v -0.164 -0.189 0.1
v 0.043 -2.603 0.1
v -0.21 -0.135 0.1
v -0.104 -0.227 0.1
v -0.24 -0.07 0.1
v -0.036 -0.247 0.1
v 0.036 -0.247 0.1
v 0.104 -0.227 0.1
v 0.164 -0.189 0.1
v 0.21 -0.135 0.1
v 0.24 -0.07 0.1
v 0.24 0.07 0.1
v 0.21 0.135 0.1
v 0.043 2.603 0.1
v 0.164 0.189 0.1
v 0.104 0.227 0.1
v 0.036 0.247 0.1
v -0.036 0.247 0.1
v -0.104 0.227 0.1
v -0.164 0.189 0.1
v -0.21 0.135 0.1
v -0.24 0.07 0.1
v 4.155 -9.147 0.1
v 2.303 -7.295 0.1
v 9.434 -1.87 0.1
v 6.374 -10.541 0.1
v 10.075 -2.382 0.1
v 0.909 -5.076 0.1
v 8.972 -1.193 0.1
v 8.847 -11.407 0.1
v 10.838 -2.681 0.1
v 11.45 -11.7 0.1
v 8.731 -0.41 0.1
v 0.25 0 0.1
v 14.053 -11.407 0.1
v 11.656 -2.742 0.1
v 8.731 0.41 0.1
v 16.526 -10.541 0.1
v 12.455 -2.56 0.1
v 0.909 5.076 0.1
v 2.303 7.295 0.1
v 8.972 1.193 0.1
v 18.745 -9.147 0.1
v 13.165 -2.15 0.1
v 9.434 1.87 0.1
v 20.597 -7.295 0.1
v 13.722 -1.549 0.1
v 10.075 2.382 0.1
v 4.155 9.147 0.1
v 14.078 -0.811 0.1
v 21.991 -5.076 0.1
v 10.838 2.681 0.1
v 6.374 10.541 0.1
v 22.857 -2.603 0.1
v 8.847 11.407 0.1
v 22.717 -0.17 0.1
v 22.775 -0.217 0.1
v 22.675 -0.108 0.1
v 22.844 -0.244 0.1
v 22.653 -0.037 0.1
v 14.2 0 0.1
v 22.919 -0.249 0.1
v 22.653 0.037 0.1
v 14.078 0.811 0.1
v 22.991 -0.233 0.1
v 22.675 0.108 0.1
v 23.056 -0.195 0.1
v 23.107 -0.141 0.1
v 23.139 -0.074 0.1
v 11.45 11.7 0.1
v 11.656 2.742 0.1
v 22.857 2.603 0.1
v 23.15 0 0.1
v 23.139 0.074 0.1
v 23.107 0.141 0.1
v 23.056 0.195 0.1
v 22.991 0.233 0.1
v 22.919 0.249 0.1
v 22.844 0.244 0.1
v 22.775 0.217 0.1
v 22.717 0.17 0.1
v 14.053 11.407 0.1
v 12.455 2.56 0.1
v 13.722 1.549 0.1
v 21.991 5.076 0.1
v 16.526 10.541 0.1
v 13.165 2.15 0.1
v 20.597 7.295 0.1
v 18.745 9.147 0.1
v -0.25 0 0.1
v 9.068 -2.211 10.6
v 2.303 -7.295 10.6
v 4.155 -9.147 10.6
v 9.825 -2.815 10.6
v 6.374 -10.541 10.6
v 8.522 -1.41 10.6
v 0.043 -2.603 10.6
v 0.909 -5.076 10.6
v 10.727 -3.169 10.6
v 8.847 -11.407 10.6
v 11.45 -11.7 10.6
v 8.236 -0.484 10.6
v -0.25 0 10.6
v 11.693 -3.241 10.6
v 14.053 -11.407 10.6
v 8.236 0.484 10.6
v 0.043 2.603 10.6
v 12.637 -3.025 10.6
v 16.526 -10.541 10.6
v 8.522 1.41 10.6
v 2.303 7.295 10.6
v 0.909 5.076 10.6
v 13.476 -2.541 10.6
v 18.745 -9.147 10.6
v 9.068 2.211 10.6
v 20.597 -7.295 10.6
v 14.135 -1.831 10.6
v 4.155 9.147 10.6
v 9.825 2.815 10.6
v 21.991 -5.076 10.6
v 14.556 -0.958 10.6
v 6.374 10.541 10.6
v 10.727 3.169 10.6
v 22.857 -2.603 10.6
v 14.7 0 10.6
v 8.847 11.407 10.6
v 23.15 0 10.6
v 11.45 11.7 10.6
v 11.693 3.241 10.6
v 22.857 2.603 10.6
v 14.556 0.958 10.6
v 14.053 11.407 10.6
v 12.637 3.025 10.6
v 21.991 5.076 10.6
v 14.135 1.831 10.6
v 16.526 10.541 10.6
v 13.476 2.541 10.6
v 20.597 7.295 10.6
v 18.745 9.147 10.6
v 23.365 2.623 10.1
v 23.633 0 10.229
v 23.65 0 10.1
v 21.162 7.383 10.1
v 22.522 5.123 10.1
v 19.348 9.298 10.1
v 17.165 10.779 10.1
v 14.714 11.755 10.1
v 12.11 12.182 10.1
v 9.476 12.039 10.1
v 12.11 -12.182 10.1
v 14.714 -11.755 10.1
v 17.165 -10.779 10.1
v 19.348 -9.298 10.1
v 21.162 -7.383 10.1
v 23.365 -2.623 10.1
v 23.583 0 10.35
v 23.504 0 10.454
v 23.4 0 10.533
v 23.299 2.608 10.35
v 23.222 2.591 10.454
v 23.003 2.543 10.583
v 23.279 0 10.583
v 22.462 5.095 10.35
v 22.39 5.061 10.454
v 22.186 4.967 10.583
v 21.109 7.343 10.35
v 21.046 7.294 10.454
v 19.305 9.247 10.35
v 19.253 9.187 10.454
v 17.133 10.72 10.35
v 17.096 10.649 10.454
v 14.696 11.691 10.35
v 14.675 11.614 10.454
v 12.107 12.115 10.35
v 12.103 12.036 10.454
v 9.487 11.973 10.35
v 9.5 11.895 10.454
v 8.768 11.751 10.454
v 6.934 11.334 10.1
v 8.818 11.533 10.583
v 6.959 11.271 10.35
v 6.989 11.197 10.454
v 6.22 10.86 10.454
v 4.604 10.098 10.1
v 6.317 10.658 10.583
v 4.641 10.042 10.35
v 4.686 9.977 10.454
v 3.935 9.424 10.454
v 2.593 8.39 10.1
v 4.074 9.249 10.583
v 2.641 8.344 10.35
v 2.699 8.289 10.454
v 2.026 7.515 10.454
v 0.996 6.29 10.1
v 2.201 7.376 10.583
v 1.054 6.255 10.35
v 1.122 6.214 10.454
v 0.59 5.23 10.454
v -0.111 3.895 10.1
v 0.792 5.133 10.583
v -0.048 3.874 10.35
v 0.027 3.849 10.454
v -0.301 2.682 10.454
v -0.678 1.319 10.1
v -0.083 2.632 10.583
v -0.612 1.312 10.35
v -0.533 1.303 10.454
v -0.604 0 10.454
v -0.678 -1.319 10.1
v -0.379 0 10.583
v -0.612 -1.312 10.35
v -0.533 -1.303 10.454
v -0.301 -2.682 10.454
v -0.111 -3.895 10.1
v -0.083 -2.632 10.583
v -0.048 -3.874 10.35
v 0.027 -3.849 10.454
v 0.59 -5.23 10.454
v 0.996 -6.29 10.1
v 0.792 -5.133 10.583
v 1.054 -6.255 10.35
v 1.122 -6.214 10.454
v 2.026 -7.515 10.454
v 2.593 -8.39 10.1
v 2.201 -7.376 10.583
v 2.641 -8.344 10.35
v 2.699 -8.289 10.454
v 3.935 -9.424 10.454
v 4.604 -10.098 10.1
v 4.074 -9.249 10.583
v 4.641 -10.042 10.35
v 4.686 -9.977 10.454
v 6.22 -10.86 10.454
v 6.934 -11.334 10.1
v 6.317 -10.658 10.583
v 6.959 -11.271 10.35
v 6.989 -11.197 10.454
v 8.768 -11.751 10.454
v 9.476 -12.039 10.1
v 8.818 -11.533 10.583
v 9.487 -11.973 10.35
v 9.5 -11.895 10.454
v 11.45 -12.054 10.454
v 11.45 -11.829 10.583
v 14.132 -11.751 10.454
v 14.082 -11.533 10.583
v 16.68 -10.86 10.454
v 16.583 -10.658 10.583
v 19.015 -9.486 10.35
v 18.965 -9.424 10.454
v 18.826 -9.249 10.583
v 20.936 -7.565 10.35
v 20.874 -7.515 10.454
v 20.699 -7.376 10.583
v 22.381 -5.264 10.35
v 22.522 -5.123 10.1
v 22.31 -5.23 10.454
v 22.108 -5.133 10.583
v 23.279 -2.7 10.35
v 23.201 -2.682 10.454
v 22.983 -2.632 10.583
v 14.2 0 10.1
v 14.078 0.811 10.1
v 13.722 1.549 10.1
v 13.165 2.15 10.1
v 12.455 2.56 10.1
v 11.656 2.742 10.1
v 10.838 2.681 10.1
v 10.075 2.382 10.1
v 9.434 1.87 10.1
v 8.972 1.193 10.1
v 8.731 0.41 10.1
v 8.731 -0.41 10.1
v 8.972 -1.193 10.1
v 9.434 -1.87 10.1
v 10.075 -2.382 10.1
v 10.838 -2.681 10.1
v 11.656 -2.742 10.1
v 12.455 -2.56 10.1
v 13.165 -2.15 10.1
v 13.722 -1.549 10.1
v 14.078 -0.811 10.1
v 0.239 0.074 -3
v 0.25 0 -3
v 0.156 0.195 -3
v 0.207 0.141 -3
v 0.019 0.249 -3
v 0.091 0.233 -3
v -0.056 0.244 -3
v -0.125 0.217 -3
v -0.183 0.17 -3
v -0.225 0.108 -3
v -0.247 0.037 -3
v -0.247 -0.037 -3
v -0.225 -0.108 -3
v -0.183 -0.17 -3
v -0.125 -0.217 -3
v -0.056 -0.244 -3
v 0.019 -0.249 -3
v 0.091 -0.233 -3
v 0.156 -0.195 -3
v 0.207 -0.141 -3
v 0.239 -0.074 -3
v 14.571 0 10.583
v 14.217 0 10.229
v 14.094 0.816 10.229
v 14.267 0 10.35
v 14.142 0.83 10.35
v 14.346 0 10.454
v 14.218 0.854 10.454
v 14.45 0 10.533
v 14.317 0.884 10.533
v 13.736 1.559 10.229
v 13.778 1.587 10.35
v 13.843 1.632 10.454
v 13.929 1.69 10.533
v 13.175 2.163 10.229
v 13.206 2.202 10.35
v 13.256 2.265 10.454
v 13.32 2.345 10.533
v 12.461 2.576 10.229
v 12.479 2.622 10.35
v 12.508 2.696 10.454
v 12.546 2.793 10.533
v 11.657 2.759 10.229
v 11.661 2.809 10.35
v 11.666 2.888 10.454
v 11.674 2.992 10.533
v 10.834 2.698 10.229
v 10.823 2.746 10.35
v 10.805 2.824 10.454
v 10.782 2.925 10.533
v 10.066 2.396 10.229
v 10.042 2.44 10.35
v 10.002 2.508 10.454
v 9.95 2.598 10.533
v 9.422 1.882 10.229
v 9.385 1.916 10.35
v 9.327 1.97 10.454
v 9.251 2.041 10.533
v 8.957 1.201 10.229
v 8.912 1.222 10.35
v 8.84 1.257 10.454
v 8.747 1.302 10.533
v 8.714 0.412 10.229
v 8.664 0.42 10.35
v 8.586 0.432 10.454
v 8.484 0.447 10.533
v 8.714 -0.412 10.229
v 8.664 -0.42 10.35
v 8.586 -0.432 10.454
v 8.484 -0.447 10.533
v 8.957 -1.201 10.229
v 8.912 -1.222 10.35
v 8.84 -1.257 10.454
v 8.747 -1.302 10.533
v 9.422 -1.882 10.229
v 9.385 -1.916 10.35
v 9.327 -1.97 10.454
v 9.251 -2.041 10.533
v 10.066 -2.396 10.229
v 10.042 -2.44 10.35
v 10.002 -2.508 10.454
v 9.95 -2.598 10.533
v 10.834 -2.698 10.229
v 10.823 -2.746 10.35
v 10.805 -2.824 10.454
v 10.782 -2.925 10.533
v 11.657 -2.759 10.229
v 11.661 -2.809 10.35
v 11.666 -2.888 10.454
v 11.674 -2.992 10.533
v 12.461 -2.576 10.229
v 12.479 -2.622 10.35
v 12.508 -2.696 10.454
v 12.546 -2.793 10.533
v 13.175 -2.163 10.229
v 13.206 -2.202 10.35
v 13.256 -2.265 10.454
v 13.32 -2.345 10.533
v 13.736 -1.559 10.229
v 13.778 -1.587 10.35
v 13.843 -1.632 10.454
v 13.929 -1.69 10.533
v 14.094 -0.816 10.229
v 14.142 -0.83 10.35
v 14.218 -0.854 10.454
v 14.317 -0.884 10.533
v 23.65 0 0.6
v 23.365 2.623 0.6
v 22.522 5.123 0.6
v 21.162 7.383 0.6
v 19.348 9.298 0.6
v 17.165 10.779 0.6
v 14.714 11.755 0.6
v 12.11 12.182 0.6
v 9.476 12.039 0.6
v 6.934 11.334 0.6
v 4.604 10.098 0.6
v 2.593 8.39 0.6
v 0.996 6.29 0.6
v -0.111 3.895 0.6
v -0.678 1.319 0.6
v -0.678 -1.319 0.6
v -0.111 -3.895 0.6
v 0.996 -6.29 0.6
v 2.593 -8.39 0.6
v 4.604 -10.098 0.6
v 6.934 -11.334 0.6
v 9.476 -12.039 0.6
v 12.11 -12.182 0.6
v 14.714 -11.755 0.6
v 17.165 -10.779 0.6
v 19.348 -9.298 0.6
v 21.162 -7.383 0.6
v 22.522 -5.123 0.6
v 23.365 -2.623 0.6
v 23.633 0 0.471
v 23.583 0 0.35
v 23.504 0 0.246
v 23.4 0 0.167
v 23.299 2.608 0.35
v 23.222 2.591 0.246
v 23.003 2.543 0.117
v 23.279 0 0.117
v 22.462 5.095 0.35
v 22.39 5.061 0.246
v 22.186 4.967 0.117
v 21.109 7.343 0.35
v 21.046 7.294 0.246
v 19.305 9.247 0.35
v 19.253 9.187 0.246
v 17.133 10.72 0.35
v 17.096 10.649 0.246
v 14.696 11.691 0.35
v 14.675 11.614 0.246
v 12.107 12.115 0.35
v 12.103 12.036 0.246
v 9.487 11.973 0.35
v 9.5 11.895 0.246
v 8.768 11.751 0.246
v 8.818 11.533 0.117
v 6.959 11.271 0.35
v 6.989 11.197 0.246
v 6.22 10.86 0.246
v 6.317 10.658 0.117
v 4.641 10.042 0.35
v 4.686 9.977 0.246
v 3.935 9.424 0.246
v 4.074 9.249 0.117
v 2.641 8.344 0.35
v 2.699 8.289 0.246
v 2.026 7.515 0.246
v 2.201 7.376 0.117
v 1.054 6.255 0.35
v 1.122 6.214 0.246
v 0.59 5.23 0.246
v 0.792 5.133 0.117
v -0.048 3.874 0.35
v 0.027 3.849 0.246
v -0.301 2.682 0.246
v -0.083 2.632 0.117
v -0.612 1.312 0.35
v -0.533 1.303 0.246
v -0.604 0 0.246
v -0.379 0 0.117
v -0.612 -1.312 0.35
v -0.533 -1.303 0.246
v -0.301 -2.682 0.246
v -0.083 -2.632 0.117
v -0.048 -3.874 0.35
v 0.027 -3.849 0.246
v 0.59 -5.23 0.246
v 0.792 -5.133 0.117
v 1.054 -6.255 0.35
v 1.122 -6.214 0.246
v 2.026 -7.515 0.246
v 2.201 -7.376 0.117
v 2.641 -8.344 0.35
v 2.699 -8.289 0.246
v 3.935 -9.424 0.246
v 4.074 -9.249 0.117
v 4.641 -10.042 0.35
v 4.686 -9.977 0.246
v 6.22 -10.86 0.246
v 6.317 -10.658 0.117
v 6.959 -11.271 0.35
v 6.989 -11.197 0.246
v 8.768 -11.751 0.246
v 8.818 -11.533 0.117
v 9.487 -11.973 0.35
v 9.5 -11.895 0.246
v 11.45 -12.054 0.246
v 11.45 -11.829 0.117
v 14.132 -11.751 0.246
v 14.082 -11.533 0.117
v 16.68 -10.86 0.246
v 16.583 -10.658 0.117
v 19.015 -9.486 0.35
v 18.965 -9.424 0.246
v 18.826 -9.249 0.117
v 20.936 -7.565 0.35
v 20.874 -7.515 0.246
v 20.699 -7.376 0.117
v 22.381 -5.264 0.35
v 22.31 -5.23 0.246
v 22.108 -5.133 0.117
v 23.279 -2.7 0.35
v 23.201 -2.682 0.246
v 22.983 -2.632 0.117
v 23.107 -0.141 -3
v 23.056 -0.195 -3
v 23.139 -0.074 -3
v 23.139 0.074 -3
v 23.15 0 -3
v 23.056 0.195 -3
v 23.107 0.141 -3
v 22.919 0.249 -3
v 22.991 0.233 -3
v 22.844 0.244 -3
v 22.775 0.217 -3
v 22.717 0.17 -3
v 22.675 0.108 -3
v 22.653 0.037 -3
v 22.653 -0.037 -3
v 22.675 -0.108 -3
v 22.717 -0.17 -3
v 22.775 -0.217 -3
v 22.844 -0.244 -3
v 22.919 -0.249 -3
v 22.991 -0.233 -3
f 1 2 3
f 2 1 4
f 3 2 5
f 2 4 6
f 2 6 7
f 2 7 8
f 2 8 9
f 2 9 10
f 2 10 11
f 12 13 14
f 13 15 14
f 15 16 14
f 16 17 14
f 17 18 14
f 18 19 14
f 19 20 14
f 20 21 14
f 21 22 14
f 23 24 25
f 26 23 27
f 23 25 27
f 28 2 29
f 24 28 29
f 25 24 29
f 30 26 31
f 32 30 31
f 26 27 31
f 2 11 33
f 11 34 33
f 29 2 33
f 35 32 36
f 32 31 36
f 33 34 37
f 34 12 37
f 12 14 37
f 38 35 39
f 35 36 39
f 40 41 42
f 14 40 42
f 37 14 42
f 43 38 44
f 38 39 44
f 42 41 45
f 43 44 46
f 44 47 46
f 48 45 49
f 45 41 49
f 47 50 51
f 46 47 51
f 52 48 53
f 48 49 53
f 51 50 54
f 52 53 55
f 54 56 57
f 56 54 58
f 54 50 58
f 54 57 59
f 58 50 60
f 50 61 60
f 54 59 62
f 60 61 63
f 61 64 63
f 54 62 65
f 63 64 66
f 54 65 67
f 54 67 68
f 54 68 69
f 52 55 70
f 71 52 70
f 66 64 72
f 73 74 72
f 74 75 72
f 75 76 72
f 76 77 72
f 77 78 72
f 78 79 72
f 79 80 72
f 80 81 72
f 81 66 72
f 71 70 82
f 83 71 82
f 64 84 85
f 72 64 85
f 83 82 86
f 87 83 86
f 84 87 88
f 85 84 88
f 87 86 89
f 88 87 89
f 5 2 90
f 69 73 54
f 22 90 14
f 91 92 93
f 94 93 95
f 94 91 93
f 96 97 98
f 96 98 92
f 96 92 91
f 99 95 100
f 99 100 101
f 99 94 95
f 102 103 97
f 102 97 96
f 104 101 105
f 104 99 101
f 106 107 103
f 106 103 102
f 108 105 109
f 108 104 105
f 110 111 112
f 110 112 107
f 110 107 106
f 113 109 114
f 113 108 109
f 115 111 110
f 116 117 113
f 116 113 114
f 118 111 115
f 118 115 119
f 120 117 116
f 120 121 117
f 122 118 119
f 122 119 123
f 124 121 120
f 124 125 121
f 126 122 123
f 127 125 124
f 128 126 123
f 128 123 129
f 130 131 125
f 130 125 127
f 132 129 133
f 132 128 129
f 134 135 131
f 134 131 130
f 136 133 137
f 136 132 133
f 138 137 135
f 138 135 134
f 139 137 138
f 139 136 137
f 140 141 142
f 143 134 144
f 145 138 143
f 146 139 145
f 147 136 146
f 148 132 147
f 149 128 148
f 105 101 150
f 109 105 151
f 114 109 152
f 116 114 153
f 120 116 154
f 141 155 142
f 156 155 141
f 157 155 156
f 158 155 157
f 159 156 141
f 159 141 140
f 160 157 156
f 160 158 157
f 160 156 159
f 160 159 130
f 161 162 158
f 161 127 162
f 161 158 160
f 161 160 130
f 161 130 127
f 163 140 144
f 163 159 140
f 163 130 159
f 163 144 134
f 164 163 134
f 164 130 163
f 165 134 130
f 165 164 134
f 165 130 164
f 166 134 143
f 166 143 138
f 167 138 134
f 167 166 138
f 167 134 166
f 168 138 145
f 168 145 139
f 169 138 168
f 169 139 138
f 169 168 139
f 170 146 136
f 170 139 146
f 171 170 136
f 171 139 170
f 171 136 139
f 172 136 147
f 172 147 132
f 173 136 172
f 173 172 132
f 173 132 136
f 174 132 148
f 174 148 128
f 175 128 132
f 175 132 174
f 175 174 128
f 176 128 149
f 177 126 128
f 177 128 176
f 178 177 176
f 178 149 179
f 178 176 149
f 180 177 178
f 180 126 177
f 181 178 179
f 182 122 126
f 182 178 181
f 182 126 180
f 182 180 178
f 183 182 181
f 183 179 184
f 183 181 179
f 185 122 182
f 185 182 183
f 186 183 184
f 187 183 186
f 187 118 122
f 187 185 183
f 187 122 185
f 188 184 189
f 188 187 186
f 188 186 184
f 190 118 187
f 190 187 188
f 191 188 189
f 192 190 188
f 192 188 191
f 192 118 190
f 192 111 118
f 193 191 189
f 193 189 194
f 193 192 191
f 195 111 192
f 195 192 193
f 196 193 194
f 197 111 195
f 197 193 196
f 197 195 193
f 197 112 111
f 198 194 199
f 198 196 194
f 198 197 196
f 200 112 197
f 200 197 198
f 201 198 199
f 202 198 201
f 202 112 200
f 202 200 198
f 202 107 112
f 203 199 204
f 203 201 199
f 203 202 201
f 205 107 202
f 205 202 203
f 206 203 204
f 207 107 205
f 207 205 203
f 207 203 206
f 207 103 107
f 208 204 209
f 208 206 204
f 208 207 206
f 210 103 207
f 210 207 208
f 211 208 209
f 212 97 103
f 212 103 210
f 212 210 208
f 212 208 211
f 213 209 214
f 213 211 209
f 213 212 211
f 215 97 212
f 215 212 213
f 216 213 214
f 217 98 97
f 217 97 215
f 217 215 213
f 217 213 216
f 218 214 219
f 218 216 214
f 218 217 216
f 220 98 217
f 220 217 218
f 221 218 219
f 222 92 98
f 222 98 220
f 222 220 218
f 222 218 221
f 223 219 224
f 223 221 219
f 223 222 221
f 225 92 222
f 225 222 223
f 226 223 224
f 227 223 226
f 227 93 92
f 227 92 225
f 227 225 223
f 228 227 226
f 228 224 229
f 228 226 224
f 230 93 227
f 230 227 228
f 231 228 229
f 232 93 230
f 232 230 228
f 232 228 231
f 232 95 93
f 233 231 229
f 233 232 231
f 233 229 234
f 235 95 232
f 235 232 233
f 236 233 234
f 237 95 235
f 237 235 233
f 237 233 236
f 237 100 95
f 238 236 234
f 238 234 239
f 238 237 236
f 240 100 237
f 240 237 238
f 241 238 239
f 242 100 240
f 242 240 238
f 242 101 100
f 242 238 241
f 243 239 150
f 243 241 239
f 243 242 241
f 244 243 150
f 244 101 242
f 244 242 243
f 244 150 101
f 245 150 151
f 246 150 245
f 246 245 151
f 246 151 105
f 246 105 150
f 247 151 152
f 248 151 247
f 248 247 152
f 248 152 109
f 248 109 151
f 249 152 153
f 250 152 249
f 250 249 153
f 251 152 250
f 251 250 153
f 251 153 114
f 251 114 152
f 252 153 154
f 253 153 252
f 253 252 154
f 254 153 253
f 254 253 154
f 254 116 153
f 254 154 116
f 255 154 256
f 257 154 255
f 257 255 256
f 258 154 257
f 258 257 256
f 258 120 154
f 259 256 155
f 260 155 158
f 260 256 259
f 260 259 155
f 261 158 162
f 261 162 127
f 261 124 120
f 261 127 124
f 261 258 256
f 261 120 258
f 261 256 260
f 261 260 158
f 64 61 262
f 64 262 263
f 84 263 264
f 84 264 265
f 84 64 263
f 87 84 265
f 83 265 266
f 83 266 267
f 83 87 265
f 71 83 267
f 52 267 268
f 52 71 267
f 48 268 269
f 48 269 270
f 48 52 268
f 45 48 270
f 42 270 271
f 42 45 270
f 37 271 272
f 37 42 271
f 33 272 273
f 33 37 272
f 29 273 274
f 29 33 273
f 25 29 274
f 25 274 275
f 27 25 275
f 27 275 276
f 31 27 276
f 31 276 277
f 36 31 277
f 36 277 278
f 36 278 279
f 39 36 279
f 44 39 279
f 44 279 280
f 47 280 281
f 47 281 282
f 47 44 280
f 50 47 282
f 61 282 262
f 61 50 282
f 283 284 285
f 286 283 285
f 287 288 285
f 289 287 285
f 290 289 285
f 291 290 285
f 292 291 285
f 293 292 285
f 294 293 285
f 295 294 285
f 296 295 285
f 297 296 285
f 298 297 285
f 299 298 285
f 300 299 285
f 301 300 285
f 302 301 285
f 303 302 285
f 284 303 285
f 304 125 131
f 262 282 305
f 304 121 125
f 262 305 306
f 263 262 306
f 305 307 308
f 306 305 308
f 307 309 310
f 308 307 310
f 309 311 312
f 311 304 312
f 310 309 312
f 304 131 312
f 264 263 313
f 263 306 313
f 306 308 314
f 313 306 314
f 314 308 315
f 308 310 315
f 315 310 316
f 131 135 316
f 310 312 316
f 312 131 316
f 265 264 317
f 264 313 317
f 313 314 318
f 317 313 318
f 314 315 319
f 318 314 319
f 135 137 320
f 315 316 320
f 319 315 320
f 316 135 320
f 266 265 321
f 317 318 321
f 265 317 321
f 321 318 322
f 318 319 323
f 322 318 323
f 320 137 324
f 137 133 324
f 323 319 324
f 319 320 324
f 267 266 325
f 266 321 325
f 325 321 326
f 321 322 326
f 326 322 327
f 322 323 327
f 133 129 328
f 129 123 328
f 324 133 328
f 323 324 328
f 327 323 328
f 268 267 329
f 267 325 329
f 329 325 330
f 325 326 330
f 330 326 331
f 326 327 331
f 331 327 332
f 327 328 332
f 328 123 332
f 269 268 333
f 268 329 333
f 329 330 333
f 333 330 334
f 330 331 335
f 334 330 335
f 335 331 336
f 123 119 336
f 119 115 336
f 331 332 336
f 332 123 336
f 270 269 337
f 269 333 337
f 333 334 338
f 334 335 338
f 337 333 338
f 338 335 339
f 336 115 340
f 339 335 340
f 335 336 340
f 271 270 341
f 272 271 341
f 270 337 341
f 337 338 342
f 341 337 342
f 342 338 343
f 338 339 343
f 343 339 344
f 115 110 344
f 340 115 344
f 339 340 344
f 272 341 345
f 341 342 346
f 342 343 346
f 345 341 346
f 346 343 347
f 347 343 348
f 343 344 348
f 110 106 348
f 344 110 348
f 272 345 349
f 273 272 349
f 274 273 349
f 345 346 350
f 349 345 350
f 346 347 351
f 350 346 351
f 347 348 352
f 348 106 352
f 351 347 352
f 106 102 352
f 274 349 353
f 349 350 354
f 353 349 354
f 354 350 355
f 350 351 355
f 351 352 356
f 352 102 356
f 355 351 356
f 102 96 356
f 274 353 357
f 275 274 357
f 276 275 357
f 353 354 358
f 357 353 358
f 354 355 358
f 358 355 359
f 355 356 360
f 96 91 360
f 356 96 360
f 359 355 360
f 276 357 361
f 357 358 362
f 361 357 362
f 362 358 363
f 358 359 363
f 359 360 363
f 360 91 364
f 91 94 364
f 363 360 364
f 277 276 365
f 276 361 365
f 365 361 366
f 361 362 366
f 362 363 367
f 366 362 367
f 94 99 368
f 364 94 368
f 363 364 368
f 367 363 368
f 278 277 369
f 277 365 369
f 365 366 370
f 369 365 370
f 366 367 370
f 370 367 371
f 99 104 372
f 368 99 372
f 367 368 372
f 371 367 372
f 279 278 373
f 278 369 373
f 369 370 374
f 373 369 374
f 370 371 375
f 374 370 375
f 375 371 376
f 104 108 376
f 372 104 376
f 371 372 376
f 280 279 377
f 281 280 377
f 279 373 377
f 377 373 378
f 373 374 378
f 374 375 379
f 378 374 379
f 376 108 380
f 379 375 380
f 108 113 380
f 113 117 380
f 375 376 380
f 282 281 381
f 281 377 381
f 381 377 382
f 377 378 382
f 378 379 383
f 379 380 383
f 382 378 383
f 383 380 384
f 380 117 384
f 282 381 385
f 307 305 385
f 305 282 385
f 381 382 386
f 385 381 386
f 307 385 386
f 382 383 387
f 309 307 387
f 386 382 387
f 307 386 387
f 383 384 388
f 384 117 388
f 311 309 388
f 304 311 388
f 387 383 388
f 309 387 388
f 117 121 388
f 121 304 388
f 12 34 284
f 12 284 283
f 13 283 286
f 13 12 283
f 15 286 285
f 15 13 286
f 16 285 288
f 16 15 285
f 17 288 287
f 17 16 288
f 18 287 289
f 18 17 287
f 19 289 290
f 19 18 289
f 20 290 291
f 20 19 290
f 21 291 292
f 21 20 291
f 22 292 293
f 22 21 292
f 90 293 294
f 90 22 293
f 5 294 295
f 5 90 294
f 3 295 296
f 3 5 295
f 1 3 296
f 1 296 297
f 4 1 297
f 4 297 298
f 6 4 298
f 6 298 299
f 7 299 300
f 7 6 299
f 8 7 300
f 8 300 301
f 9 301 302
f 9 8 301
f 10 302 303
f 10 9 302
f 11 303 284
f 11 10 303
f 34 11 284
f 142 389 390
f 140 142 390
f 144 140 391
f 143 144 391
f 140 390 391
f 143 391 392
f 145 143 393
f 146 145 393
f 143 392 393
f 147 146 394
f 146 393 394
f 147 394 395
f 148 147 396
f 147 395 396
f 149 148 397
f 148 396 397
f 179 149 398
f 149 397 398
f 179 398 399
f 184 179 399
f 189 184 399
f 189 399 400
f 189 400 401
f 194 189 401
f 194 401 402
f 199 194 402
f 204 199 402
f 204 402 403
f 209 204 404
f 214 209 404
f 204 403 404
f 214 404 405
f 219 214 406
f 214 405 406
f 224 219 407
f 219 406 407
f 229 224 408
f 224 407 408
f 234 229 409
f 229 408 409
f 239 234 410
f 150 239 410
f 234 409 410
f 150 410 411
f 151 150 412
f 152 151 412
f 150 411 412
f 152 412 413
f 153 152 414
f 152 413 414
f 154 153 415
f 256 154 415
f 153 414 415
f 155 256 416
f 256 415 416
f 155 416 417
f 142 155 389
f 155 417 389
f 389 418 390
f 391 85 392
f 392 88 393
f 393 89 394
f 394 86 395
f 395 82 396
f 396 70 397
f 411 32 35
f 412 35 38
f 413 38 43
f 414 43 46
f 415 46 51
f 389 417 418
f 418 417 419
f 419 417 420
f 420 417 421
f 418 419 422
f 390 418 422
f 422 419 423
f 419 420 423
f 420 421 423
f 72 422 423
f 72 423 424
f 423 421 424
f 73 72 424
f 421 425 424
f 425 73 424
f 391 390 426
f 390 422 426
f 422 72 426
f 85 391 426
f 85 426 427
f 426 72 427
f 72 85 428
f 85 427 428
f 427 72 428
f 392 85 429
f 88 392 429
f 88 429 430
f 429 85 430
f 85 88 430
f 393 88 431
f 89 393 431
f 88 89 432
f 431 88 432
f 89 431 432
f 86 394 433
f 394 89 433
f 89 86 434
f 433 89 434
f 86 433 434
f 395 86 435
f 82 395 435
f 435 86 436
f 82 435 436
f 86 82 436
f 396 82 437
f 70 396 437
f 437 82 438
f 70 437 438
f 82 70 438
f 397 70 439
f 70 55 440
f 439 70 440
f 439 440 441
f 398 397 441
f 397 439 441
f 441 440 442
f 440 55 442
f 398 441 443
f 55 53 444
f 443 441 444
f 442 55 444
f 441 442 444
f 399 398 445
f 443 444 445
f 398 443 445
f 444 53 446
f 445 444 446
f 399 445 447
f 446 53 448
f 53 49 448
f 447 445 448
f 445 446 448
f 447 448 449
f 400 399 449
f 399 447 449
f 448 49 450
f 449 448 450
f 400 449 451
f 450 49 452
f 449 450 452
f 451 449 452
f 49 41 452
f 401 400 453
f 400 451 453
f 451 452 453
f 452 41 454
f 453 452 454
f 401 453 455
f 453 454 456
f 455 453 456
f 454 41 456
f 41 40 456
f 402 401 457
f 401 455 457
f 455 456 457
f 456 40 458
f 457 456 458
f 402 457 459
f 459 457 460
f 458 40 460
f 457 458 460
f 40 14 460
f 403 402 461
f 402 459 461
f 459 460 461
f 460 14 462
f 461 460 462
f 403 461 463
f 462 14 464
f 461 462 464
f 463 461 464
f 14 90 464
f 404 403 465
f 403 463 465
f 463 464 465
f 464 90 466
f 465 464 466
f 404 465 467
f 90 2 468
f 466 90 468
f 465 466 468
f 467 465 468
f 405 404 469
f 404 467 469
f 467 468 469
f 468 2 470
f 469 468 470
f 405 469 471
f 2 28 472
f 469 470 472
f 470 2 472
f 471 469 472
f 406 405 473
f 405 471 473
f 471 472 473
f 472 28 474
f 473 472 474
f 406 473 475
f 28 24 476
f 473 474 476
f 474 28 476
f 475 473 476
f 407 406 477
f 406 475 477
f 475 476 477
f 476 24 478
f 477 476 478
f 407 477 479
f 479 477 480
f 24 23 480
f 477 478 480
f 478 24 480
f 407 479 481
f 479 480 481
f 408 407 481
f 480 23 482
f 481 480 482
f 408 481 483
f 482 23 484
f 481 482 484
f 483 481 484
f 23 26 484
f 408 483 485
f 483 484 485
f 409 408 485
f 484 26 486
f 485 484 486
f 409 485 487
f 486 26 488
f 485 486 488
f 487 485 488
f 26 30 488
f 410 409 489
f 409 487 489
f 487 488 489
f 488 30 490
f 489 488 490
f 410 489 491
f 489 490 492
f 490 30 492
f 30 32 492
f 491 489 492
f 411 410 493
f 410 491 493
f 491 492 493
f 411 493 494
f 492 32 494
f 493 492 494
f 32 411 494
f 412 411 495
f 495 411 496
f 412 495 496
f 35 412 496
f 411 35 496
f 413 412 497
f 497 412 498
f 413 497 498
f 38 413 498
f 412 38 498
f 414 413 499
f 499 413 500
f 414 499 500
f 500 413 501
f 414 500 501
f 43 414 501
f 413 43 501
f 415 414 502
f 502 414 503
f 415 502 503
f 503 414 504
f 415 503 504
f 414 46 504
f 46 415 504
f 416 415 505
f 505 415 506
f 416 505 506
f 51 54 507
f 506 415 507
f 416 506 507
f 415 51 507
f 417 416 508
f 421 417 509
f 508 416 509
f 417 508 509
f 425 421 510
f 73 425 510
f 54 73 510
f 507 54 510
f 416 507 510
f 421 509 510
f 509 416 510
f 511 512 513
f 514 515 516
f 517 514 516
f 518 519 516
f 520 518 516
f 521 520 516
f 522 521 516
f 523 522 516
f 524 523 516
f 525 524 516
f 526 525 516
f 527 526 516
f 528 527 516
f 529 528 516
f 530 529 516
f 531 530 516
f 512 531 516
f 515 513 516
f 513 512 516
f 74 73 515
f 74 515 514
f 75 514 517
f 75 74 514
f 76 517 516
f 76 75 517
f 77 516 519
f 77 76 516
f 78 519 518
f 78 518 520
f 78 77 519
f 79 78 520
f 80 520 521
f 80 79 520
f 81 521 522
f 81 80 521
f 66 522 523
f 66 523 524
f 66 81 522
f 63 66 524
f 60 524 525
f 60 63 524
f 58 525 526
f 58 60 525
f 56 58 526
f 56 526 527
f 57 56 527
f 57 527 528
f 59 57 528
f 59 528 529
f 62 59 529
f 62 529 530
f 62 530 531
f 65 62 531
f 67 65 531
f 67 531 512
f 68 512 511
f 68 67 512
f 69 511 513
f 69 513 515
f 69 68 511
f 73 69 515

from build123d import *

# Parameters (mm, degrees)
SKETCH001_R       = 0.25
PAD001_DEPTH      = 5.25
PAD001_DEPTH_BACK = 3.5
SKETCH_R          = 12.2
SKETCH_R_2        = 2.75
PAD_DEPTH         = 10.5
FILLET_R          = 0.5


with BuildPart() as pad001:
    # Sketch001 → Pad001 (new body, two sides)
    with BuildSketch(Plane.XY.offset(0.5)) as pad001_sk:
        Circle(SKETCH001_R)
        with Locations((22.9, 0)):
            Circle(SKETCH001_R)
    extrude(amount=PAD001_DEPTH)
    extrude(pad001_sk.sketch, amount=-PAD001_DEPTH_BACK)


with BuildPart() as fillet_mp_cp:
    # Sketch → Pad (new body)
    with BuildSketch(Plane.XY.offset(0.1)):
        with Locations((11.45, 0)):
            Circle(SKETCH_R)
        with Locations((11.45, 0)):
            Circle(SKETCH_R_2, mode=Mode.SUBTRACT)
    extrude(amount=PAD_DEPTH)

    # Fillet
    fillet_edges = [fillet_mp_cp.edges().sort_by_distance(p)[0] for p in [
        (8.7, 0, 10.6),
        (-0.75, 0, 10.6),
        (-0.75, 0, 0.1),
    ]]
    fillet(fillet_edges, radius=FILLET_R)

    # Fillet_mp_cp: union Pad001
    add(pad001.part)


solid = fillet_mp_cp.part
